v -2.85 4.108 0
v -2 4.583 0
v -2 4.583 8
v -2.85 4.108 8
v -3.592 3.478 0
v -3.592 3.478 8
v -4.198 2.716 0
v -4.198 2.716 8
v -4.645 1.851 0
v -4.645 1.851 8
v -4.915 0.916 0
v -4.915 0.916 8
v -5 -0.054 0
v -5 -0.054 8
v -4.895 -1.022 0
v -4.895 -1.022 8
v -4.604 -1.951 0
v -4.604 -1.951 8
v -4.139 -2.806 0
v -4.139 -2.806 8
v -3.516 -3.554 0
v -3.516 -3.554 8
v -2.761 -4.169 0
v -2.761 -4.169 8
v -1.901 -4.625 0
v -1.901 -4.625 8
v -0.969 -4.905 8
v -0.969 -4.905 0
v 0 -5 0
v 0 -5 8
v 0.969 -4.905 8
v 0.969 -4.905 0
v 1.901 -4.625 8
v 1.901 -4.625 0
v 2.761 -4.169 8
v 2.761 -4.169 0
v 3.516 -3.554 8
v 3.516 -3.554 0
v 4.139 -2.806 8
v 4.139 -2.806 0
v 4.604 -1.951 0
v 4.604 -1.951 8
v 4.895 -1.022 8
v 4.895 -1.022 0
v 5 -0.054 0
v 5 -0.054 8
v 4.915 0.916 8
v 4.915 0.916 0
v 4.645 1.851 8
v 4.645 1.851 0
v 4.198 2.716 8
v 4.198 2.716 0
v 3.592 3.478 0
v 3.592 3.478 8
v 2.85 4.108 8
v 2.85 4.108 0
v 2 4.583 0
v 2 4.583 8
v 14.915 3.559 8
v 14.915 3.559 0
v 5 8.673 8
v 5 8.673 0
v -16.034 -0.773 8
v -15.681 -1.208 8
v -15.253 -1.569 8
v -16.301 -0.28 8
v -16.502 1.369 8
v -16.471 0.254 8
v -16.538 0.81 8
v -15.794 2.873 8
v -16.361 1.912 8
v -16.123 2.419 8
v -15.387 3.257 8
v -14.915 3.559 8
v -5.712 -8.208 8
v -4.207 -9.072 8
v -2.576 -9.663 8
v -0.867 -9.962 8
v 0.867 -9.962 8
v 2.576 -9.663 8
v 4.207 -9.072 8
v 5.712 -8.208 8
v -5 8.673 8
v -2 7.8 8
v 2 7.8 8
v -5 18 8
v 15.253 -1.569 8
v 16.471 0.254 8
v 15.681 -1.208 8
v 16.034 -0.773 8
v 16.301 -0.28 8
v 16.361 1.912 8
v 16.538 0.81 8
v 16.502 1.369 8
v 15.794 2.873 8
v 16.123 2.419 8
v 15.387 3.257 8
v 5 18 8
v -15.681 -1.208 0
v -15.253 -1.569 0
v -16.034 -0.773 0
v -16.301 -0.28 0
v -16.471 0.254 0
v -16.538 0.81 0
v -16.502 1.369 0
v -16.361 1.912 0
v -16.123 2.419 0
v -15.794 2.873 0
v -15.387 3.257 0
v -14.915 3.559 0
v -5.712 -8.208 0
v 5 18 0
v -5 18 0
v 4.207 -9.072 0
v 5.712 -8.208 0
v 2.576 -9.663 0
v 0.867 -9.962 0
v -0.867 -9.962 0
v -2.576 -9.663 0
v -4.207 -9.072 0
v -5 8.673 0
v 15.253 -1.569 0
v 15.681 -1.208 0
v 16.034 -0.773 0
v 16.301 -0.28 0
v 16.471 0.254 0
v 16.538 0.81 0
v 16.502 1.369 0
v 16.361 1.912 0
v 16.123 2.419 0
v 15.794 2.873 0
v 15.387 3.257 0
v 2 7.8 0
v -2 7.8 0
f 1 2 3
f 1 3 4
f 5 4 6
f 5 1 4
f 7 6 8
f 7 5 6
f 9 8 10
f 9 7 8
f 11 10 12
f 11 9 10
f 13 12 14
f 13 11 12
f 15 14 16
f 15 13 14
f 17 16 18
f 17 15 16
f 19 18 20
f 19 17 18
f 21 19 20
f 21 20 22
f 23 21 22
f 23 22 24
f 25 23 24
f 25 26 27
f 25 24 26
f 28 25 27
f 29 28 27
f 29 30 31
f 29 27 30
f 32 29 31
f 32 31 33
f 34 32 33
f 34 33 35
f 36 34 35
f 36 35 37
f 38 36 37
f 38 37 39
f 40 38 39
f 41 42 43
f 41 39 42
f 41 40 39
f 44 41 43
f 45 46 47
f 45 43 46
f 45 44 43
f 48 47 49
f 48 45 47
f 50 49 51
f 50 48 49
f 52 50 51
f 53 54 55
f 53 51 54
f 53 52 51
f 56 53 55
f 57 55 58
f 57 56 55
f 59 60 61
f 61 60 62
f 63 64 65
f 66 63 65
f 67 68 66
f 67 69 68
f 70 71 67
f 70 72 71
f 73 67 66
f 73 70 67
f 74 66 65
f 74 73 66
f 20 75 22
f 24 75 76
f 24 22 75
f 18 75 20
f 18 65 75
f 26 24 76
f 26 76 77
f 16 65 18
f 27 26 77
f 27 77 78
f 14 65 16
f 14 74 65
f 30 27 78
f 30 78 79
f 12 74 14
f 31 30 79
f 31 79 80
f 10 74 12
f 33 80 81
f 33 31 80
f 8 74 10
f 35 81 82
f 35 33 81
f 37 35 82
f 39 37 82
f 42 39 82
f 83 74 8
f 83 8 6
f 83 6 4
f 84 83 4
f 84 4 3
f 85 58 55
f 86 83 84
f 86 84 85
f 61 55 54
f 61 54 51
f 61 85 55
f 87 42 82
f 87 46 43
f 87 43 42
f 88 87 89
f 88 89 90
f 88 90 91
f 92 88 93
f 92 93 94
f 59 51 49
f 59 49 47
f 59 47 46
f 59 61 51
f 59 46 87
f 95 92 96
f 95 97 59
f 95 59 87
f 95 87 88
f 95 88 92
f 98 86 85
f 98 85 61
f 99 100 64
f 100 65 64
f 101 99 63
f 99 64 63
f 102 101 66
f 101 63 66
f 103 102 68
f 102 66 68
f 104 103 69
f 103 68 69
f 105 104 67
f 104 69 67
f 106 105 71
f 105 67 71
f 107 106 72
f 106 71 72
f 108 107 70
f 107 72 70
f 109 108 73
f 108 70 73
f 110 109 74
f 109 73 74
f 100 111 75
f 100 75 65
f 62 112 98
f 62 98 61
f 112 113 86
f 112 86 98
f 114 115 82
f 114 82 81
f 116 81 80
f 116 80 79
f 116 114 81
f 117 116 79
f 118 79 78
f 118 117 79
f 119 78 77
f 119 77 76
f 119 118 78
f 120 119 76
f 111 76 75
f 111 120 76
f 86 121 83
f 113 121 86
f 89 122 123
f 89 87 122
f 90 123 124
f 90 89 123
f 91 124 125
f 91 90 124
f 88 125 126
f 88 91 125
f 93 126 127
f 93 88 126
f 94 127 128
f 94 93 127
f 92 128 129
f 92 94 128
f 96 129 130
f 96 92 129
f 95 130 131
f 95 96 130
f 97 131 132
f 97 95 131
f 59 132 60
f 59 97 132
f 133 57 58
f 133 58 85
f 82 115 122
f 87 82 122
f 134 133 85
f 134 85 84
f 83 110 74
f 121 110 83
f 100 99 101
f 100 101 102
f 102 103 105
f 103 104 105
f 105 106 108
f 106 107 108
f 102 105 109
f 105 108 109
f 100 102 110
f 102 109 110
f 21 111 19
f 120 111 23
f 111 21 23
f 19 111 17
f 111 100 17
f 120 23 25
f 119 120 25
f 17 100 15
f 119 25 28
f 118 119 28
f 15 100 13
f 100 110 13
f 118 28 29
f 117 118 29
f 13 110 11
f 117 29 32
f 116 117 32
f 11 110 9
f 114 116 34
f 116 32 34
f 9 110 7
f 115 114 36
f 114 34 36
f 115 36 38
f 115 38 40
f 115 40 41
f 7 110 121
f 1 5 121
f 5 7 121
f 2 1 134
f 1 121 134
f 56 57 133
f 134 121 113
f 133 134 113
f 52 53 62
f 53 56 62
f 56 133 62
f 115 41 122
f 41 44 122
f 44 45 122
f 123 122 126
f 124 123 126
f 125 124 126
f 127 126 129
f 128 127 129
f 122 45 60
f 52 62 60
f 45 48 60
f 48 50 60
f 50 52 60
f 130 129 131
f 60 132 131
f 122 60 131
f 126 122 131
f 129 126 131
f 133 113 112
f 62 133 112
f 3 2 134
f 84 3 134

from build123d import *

# Parameters (mm, degrees)
SKETCH1_R           = 5
BOSS_EXTRUDE1_DEPTH = 8
BOSS_EXTRUDE2_DEPTH = 8
FILLET1_R           = 3
SKETCH3_W           = 4
SKETCH3_H           = 4.3
CUT_EXTRUDE1_DEPTH  = 26.720756349


with BuildPart() as part:
    # Sketch1 → Boss-Extrude1 (new body)
    with BuildSketch(Plane.XY):
        with BuildLine():
            Line((-5, 8.660254038), (-5, 18))
            Line((-5, 18), (5, 18))
            Line((5, 18), (5, 8.660254038))
            ThreePointArc((5, 8.660254038), (0, -10), (-5, 8.660254038))
        make_face()
        Circle(SKETCH1_R, mode=Mode.SUBTRACT)
    extrude(amount=BOSS_EXTRUDE1_DEPTH)

    # Sketch2 → Boss-Extrude2 (add)
    with BuildSketch(Plane(origin=(0, 0, 0), x_dir=(-1, 0, 0), z_dir=(0, 0, -1))):
        with BuildLine():
            Line((-5.711537543, -8.208430964), (-19.342239895, 1.275996517))
            Line((-19.342239895, 1.275996517), (-4.583721925, 8.887603351))
            ThreePointArc((-4.583721925, 8.887603351), (-9.978310939, 0.658263473), (-5.711537543, -8.208430964))
        make_face()
        with BuildLine():
            Line((5.711537543, -8.208430964), (19.342239895, 1.275996517))
            Line((19.342239895, 1.275996517), (4.583721925, 8.887603351))
            ThreePointArc((4.583721925, 8.887603351), (9.978310939, 0.658263473), (5.711537543, -8.208430964))
        make_face()
    extrude(amount=-BOSS_EXTRUDE2_DEPTH)

    # Fillet1
    fillet1_edges = [part.edges().sort_by_distance(p)[0] for p in [
        (19.342239895, 1.275996517, 4),
        (-19.342239895, 1.275996517, 4),
    ]]
    fillet(fillet1_edges, radius=FILLET1_R)

    # Sketch3 → Cut-Extrude1 (cut, through all)
    with BuildSketch(Plane(origin=(0, 0, 0), x_dir=(-1, 0, 0), z_dir=(0, 0, -1))):
        with Locations((0, 5.65)):
            Rectangle(SKETCH3_W, SKETCH3_H)
    extrude(amount=-CUT_EXTRUDE1_DEPTH, mode=Mode.SUBTRACT)


solid = part.part
